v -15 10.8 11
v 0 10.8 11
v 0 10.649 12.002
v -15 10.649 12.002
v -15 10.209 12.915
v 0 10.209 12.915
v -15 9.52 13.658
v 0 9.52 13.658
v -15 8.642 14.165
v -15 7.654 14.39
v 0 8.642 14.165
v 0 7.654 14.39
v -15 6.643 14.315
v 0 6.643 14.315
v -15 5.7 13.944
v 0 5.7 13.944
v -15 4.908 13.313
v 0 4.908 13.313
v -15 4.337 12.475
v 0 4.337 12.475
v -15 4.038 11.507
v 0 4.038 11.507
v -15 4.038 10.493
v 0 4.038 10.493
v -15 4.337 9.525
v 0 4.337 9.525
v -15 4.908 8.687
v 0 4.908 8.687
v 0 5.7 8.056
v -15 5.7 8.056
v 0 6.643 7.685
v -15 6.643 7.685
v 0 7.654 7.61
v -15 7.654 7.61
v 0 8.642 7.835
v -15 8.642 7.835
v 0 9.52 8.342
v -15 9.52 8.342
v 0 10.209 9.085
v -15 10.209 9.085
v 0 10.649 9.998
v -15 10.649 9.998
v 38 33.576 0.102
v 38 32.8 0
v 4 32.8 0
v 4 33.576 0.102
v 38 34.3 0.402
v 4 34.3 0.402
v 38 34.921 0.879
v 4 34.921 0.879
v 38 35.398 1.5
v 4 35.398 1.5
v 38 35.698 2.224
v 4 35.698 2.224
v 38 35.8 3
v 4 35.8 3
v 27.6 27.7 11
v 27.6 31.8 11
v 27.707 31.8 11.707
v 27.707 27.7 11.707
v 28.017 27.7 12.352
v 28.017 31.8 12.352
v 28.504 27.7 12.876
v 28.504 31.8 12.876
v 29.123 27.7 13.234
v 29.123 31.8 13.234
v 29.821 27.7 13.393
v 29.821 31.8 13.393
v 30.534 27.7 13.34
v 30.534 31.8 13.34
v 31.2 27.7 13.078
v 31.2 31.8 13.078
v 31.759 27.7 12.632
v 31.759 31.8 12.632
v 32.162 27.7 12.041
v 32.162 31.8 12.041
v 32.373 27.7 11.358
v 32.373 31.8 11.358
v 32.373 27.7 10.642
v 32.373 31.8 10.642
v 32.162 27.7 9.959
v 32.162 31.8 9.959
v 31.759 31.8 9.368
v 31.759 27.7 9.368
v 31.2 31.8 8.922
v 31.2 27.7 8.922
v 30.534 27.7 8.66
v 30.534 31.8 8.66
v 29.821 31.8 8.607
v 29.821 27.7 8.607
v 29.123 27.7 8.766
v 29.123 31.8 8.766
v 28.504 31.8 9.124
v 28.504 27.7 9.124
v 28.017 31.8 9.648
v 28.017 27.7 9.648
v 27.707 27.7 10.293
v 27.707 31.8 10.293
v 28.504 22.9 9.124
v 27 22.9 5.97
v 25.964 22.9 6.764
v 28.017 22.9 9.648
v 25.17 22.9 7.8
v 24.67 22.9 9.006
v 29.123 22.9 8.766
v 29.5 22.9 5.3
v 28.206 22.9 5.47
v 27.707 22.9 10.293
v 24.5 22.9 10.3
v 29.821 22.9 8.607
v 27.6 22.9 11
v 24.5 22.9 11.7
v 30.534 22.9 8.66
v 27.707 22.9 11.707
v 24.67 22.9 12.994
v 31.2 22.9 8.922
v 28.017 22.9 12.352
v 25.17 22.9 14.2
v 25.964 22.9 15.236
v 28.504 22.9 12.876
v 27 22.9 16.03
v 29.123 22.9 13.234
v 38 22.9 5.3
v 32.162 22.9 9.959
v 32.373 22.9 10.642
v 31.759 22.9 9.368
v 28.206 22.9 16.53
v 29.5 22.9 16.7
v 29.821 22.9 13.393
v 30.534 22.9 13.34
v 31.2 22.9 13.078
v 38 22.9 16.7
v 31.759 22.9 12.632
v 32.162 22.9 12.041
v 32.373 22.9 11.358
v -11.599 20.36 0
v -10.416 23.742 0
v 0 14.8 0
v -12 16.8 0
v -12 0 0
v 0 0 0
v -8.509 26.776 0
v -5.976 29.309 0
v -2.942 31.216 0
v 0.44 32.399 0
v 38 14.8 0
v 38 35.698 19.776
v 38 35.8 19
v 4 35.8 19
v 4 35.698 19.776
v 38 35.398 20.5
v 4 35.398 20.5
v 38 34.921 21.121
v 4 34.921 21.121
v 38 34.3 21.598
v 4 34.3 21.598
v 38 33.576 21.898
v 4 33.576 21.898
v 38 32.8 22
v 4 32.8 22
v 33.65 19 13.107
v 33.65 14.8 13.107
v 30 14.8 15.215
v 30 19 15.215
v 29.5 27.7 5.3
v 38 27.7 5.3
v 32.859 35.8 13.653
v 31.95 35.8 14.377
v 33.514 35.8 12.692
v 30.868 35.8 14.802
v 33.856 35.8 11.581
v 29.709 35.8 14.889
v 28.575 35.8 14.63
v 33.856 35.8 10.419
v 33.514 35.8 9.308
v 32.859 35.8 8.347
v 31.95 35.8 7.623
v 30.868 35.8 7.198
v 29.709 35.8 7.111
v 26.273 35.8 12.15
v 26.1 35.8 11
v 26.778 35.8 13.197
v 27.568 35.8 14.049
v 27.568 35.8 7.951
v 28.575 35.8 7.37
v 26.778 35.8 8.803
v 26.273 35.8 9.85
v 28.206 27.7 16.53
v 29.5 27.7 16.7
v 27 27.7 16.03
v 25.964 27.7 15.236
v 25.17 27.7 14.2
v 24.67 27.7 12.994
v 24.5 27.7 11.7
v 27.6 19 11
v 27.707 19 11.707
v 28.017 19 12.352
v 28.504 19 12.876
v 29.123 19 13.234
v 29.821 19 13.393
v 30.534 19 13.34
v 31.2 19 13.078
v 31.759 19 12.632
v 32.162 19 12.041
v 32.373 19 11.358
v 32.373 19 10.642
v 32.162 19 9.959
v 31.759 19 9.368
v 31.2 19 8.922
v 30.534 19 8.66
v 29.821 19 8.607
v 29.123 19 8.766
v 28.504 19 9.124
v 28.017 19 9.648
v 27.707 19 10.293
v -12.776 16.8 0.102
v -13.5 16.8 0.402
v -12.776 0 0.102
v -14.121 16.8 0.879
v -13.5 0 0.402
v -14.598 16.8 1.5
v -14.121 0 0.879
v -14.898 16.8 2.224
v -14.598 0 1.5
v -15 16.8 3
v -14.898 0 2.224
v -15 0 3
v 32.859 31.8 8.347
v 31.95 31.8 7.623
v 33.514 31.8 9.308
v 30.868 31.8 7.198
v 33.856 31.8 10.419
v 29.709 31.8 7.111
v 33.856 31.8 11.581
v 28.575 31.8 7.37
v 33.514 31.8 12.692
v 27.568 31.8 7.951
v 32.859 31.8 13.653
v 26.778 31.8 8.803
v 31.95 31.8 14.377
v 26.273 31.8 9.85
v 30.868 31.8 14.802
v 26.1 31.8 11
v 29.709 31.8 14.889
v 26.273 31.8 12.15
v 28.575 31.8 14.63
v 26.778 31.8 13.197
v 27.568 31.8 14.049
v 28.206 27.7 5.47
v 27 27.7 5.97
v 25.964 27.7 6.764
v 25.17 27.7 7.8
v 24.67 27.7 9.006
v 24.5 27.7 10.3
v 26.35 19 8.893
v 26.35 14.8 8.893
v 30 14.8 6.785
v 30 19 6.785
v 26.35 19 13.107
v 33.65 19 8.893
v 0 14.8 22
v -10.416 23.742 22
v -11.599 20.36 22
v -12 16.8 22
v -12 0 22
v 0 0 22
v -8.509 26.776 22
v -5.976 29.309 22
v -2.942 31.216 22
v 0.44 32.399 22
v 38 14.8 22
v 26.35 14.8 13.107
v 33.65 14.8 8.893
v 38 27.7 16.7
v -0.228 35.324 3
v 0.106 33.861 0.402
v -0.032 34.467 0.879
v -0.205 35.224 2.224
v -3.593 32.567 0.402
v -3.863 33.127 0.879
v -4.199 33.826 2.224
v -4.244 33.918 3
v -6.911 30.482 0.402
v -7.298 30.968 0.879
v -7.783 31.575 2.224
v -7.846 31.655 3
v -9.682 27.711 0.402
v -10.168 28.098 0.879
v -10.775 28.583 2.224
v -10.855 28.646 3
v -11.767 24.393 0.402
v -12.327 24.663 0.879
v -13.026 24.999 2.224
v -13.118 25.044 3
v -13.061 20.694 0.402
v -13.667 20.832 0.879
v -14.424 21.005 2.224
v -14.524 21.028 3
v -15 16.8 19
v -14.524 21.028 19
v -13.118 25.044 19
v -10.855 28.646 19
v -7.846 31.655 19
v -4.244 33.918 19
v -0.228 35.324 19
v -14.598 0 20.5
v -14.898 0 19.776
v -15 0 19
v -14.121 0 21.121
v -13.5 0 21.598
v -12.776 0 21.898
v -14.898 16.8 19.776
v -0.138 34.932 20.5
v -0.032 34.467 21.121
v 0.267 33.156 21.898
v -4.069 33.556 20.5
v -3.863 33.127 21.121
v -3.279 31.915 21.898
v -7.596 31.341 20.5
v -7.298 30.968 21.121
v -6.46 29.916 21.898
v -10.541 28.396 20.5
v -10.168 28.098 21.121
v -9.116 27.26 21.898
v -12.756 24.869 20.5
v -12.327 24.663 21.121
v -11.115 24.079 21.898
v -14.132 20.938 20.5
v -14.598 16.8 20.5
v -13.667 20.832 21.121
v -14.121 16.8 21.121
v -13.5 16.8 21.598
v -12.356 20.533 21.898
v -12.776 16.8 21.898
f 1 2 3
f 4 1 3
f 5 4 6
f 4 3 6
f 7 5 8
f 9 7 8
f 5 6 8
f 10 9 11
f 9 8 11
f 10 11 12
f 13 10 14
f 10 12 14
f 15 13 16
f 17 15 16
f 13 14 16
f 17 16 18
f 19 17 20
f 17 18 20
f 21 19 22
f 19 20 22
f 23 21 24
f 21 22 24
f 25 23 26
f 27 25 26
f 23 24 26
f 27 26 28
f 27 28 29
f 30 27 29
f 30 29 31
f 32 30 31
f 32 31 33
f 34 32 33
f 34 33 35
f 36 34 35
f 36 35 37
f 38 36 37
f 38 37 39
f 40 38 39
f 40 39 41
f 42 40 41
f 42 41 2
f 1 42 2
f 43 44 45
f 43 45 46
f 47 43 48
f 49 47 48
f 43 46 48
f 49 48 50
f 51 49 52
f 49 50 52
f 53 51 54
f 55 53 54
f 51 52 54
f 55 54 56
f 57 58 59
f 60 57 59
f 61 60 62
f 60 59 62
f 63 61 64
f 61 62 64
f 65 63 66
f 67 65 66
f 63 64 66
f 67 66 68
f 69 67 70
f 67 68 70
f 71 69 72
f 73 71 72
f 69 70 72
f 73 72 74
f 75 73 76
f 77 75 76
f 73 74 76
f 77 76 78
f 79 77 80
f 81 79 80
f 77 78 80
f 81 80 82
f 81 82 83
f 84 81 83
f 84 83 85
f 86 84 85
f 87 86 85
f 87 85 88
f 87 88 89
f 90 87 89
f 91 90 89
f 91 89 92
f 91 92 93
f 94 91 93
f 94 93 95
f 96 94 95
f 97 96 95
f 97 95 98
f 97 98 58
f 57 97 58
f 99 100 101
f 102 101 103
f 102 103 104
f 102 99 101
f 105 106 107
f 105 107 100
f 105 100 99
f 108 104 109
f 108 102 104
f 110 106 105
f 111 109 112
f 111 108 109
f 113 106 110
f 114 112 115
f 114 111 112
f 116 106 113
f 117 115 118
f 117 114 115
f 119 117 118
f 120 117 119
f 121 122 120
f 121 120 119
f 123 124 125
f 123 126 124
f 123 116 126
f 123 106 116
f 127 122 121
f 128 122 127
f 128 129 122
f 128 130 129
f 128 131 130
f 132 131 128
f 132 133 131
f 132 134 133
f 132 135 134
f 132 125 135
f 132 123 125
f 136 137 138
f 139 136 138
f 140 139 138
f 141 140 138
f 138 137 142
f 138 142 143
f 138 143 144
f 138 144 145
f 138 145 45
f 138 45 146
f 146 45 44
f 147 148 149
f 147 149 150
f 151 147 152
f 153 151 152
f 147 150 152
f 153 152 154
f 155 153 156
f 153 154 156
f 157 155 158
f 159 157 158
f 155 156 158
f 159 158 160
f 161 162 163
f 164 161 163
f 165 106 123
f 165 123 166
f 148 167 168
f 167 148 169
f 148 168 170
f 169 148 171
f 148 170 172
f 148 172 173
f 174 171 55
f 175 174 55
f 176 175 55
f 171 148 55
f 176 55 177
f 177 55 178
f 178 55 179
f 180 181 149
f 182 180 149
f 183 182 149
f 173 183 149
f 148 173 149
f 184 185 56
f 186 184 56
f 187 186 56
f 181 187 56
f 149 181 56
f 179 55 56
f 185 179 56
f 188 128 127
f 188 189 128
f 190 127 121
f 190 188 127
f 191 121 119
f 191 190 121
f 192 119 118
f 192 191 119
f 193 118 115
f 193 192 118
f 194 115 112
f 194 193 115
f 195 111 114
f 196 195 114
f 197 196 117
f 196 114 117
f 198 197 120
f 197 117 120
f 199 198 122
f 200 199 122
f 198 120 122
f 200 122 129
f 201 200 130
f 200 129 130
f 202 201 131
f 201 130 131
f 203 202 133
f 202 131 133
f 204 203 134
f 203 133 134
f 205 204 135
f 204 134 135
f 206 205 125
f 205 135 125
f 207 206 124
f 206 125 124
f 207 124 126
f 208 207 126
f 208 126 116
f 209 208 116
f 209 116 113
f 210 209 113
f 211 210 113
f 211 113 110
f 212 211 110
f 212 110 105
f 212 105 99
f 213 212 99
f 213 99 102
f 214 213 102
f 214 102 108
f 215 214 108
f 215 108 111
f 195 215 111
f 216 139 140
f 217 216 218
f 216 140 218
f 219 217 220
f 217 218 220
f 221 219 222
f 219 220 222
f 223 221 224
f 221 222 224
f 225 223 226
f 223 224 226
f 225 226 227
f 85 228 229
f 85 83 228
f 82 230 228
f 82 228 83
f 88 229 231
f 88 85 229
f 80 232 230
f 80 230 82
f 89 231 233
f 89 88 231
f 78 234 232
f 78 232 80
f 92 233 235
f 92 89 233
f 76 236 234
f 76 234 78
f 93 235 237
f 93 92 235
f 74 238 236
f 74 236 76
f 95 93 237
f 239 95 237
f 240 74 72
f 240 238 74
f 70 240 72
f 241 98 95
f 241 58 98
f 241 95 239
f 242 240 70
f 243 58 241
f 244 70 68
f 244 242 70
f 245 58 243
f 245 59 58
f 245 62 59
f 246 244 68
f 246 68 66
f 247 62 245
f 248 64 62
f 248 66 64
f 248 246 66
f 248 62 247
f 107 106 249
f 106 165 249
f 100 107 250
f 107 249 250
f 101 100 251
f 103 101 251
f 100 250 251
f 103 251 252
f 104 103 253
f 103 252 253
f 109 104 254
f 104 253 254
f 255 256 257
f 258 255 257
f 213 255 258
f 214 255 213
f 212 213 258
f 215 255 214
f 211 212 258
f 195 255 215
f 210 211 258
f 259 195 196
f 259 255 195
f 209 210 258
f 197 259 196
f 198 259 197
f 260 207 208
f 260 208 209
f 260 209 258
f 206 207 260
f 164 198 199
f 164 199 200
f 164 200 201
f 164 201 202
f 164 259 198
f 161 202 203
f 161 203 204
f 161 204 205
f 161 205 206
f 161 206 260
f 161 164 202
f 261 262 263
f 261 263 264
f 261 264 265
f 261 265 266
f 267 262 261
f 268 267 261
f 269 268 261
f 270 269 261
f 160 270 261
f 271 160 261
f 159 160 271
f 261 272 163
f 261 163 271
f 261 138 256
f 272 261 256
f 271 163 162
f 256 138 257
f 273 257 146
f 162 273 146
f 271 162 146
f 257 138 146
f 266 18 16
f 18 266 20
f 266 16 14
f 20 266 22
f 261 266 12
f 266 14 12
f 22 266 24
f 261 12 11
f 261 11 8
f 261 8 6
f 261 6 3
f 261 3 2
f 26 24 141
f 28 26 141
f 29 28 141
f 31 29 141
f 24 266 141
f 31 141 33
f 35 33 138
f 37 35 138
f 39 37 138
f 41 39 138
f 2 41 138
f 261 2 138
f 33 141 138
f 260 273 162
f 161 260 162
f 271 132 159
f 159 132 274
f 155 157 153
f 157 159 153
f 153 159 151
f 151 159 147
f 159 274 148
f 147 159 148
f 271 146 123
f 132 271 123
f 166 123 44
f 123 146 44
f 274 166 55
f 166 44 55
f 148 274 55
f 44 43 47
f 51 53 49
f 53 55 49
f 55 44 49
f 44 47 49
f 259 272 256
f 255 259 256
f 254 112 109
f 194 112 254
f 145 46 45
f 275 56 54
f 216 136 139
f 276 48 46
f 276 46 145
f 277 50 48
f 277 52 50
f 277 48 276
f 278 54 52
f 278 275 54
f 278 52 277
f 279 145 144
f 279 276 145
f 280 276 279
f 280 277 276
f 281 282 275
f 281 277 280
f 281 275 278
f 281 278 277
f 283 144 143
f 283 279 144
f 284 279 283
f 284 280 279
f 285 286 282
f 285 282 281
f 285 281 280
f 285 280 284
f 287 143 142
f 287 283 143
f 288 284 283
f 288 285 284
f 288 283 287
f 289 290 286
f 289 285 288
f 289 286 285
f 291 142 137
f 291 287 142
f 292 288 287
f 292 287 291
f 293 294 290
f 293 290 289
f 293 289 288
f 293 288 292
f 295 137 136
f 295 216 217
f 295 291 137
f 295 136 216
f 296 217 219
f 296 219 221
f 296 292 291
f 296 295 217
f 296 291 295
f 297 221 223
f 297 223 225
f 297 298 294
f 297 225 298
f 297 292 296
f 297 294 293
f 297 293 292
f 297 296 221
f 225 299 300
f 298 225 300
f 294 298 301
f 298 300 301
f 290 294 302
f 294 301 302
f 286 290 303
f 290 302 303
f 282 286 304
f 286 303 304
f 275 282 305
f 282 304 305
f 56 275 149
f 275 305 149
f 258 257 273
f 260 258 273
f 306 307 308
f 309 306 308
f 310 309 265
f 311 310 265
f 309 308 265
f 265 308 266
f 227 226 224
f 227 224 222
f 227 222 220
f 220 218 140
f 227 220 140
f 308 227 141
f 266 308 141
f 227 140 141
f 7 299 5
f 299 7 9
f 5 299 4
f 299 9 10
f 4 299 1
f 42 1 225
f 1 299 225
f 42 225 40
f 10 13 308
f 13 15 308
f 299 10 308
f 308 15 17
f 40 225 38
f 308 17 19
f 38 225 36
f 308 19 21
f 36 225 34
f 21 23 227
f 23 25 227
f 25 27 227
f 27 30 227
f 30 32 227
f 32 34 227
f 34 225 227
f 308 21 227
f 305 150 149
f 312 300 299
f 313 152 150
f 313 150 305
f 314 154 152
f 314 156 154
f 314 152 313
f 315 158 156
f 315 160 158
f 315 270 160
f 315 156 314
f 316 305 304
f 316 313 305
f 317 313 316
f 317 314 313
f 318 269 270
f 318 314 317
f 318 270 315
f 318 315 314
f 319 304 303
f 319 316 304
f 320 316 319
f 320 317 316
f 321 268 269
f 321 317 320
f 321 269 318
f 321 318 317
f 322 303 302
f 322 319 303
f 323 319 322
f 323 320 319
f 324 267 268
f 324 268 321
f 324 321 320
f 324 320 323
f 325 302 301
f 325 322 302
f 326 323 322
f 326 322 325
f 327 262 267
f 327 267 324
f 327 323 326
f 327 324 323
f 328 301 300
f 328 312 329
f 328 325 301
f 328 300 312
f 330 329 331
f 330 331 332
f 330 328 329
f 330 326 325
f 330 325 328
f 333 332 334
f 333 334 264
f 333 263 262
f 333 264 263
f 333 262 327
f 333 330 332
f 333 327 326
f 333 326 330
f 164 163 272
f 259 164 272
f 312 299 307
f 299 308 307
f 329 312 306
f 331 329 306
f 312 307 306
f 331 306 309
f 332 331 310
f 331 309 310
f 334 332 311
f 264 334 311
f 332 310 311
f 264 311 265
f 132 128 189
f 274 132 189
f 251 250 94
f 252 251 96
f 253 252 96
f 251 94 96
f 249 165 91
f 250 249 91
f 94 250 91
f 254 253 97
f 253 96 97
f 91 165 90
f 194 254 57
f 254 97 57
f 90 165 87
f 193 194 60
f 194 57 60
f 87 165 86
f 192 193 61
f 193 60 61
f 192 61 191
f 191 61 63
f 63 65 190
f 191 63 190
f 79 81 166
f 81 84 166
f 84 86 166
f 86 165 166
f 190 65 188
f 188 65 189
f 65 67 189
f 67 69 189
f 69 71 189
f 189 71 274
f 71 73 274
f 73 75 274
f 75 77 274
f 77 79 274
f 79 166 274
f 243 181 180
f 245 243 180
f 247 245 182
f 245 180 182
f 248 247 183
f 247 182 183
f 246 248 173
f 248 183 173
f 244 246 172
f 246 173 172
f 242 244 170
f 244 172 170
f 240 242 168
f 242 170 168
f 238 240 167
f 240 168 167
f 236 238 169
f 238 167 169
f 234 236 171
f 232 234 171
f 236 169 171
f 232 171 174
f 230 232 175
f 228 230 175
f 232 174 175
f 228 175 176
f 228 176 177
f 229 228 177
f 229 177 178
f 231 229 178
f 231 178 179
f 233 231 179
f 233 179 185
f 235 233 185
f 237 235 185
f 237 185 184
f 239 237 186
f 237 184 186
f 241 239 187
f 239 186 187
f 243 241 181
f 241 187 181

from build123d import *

# Parameters (mm, degrees)
PAD_DEPTH       = 22
SKETCH001_R     = 3.4
POCKET_DEPTH    = 15.001
SKETCH002_W     = 4.8
SKETCH002_H     = 11.4
POCKET001_DEPTH = 13.5
SKETCH003_R     = 2.4
POCKET002_DEPTH = 35.801
SKETCH004_R     = 3.9
POCKET003_DEPTH = 4
POCKET004_DEPTH = 4.2
FILLET_R        = 19
FILLET001_R     = 3
FILLET002_R     = 5


with BuildPart() as part:
    # Sketch → Pad (new body)
    with BuildSketch(Plane.XY):
        Polygon((0, 0), (0, 14.8), (38, 14.8), (38, 35.8), (-15, 35.8), (-15, 0), align=None)
    extrude(amount=PAD_DEPTH)

    # Sketch001 (on Face1 of Pad) → Pocket (cut, through all)
    with BuildSketch(Plane.YZ):
        with Locations((7.4, 11)):
            Circle(SKETCH001_R)
    extrude(amount=-POCKET_DEPTH, mode=Mode.SUBTRACT)

    # Sketch002 (on Face8 of Pocket) → Pocket001 (cut)
    with BuildSketch(Plane.YZ.offset(38)):
        with Locations((25.3, 11)):
            Rectangle(SKETCH002_W, SKETCH002_H)
    extrude(amount=-POCKET001_DEPTH, mode=Mode.SUBTRACT)

    # Sketch003 (on Face9 of Pocket001) → Pocket002 (cut, through all)
    with BuildSketch(Plane(origin=(0, 35.8, 0), x_dir=(-1, 0, 0), z_dir=(0, 1, 0))):
        with Locations((-30, 11)):
            Circle(SKETCH003_R)
    extrude(amount=-POCKET002_DEPTH, mode=Mode.SUBTRACT)

    # Sketch004 (on Face9 of Pocket002) → Pocket003 (cut)
    with BuildSketch(Plane(origin=(0, 35.8, 0), x_dir=(-1, 0, 0), z_dir=(0, 1, 0))):
        with Locations((-30, 11)):
            Circle(SKETCH004_R)
    extrude(amount=-POCKET003_DEPTH, mode=Mode.SUBTRACT)

    # Sketch005 (on Face5 of Pocket003) → Pocket004 (cut)
    with BuildSketch(Plane.XZ.offset(-14.8)):
        Polygon((30, 6.785343), (33.65, 8.892672), (33.65, 13.107328), (30, 15.214657), (26.35, 13.107328), (26.35, 8.892672), align=None)
    extrude(amount=-POCKET004_DEPTH, mode=Mode.SUBTRACT)

    # Fillet
    fillet_edges = [part.edges().sort_by_distance(p)[0] for p in [
        (-15, 35.8, 11),
    ]]
    fillet(fillet_edges, radius=FILLET_R)

    # Fillet001
    fillet001_edges = [part.edges().sort_by_distance(p)[0] for p in [
        (-15, 8.4, 22),
        (-15, 8.4, 0),
    ]]
    fillet(fillet001_edges, radius=FILLET001_R)

    # Fillet002
    fillet002_edges = [part.edges().sort_by_distance(p)[0] for p in [
        (24.5, 25.3, 16.7),
        (24.5, 25.3, 5.3),
    ]]
    fillet(fillet002_edges, radius=FILLET002_R)


solid = part.part
